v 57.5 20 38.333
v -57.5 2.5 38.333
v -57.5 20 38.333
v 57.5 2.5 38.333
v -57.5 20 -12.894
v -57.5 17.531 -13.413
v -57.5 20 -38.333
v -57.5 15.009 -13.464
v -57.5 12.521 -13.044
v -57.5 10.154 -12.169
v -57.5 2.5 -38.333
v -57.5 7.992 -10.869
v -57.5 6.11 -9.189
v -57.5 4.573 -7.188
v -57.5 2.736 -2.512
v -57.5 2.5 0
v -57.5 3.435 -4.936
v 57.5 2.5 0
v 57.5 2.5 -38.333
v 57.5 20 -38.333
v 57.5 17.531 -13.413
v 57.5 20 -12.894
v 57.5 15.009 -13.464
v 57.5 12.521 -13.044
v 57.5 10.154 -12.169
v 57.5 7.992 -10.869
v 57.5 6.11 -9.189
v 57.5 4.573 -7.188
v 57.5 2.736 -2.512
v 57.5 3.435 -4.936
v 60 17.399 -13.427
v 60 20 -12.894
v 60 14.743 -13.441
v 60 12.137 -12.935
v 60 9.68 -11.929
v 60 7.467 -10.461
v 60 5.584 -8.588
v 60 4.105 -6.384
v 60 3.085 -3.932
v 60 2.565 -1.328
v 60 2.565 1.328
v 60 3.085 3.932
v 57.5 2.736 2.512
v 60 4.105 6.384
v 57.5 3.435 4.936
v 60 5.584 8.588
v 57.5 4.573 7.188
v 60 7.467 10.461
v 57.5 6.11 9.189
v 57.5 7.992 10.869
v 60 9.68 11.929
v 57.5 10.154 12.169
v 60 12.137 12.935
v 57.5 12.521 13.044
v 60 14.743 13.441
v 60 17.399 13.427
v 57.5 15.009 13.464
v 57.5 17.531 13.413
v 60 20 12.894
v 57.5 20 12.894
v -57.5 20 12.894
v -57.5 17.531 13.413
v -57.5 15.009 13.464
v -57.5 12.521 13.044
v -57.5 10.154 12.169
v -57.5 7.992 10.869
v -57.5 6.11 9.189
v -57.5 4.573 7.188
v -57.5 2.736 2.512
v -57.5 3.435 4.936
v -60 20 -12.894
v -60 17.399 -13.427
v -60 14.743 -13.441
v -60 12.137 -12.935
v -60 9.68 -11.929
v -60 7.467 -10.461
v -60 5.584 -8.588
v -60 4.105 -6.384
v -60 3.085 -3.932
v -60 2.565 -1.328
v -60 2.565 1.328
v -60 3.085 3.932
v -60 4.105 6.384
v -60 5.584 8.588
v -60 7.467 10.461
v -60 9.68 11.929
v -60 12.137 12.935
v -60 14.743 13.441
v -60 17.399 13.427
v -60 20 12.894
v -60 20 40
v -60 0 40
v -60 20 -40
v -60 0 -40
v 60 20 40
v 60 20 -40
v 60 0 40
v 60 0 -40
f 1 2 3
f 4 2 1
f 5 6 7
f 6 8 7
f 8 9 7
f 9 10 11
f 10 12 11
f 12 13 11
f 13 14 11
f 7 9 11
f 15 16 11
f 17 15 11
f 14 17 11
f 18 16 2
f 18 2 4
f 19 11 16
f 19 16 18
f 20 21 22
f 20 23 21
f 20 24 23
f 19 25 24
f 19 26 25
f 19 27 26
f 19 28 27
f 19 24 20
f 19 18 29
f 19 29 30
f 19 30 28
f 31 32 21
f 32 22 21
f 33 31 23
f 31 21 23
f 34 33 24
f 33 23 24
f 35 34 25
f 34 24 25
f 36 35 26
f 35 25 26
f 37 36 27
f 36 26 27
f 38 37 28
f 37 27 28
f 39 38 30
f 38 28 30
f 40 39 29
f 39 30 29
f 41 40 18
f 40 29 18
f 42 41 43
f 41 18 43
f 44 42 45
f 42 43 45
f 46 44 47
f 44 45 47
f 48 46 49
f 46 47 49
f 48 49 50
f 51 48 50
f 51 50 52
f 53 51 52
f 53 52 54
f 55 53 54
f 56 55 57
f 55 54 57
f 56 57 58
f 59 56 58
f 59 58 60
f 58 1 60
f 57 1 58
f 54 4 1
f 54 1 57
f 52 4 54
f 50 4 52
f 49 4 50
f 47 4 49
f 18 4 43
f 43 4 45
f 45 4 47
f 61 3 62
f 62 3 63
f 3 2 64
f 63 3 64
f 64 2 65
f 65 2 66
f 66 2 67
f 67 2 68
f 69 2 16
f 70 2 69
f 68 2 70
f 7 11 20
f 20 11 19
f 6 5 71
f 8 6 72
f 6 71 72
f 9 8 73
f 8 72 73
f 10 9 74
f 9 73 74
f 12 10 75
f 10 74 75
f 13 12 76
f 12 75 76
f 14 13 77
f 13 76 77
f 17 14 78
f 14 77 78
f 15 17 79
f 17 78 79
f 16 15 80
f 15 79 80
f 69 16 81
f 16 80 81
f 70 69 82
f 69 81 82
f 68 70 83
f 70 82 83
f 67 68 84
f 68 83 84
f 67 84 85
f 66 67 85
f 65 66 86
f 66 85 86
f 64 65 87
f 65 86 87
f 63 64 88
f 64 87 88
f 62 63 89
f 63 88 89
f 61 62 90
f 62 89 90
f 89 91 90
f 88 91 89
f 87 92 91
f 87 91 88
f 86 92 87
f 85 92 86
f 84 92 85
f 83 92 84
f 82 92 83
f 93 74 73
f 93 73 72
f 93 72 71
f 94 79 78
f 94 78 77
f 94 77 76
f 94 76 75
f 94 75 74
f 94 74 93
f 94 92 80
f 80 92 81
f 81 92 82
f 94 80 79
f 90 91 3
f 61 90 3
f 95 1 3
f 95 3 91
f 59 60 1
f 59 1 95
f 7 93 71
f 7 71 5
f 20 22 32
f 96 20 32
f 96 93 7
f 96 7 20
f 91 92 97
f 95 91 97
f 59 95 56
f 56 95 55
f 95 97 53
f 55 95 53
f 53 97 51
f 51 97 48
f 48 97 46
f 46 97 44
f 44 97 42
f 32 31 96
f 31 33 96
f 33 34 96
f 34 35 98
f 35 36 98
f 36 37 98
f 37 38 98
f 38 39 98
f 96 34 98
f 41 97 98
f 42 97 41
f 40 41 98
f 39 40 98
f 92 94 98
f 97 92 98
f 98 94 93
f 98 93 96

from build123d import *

# Parameters (mm, degrees)
SKETCH1_W           = 120
SKETCH1_H           = 80
SKETCH1_W_2         = 115
SKETCH1_H_2         = 76.666666666
BOSS_EXTRUDE1_DEPTH = 20
SKETCH1_3_W         = 115
SKETCH1_3_H         = 76.666666666
BOSS_EXTRUDE2_DEPTH = 2.5
SKETCH2_R           = 13.5
CUT_EXTRUDE1_DEPTH  = 129.062484749


with BuildPart() as part:
    # Sketch1 → Boss-Extrude1 (new body)
    with BuildSketch(Plane(origin=(0, 0, 0), x_dir=(1, 0, 0), z_dir=(0, 1, 0))):
        Rectangle(SKETCH1_W, SKETCH1_H)
        Rectangle(SKETCH1_W_2, SKETCH1_H_2, mode=Mode.SUBTRACT)
    extrude(amount=BOSS_EXTRUDE1_DEPTH)

    # Sketch1<3> → Boss-Extrude2 (add)
    with BuildSketch(Plane(origin=(0, 0, 0), x_dir=(1, 0, 0), z_dir=(0, 1, 0))):
        Rectangle(SKETCH1_3_W, SKETCH1_3_H)
    extrude(amount=BOSS_EXTRUDE2_DEPTH)

    # Sketch2 → Cut-Extrude1 (cut, through all)
    with BuildSketch(Plane.ZY.offset(60)):
        with Locations((0, 16)):
            Circle(SKETCH2_R)
    extrude(amount=-CUT_EXTRUDE1_DEPTH, mode=Mode.SUBTRACT)


solid = part.part
